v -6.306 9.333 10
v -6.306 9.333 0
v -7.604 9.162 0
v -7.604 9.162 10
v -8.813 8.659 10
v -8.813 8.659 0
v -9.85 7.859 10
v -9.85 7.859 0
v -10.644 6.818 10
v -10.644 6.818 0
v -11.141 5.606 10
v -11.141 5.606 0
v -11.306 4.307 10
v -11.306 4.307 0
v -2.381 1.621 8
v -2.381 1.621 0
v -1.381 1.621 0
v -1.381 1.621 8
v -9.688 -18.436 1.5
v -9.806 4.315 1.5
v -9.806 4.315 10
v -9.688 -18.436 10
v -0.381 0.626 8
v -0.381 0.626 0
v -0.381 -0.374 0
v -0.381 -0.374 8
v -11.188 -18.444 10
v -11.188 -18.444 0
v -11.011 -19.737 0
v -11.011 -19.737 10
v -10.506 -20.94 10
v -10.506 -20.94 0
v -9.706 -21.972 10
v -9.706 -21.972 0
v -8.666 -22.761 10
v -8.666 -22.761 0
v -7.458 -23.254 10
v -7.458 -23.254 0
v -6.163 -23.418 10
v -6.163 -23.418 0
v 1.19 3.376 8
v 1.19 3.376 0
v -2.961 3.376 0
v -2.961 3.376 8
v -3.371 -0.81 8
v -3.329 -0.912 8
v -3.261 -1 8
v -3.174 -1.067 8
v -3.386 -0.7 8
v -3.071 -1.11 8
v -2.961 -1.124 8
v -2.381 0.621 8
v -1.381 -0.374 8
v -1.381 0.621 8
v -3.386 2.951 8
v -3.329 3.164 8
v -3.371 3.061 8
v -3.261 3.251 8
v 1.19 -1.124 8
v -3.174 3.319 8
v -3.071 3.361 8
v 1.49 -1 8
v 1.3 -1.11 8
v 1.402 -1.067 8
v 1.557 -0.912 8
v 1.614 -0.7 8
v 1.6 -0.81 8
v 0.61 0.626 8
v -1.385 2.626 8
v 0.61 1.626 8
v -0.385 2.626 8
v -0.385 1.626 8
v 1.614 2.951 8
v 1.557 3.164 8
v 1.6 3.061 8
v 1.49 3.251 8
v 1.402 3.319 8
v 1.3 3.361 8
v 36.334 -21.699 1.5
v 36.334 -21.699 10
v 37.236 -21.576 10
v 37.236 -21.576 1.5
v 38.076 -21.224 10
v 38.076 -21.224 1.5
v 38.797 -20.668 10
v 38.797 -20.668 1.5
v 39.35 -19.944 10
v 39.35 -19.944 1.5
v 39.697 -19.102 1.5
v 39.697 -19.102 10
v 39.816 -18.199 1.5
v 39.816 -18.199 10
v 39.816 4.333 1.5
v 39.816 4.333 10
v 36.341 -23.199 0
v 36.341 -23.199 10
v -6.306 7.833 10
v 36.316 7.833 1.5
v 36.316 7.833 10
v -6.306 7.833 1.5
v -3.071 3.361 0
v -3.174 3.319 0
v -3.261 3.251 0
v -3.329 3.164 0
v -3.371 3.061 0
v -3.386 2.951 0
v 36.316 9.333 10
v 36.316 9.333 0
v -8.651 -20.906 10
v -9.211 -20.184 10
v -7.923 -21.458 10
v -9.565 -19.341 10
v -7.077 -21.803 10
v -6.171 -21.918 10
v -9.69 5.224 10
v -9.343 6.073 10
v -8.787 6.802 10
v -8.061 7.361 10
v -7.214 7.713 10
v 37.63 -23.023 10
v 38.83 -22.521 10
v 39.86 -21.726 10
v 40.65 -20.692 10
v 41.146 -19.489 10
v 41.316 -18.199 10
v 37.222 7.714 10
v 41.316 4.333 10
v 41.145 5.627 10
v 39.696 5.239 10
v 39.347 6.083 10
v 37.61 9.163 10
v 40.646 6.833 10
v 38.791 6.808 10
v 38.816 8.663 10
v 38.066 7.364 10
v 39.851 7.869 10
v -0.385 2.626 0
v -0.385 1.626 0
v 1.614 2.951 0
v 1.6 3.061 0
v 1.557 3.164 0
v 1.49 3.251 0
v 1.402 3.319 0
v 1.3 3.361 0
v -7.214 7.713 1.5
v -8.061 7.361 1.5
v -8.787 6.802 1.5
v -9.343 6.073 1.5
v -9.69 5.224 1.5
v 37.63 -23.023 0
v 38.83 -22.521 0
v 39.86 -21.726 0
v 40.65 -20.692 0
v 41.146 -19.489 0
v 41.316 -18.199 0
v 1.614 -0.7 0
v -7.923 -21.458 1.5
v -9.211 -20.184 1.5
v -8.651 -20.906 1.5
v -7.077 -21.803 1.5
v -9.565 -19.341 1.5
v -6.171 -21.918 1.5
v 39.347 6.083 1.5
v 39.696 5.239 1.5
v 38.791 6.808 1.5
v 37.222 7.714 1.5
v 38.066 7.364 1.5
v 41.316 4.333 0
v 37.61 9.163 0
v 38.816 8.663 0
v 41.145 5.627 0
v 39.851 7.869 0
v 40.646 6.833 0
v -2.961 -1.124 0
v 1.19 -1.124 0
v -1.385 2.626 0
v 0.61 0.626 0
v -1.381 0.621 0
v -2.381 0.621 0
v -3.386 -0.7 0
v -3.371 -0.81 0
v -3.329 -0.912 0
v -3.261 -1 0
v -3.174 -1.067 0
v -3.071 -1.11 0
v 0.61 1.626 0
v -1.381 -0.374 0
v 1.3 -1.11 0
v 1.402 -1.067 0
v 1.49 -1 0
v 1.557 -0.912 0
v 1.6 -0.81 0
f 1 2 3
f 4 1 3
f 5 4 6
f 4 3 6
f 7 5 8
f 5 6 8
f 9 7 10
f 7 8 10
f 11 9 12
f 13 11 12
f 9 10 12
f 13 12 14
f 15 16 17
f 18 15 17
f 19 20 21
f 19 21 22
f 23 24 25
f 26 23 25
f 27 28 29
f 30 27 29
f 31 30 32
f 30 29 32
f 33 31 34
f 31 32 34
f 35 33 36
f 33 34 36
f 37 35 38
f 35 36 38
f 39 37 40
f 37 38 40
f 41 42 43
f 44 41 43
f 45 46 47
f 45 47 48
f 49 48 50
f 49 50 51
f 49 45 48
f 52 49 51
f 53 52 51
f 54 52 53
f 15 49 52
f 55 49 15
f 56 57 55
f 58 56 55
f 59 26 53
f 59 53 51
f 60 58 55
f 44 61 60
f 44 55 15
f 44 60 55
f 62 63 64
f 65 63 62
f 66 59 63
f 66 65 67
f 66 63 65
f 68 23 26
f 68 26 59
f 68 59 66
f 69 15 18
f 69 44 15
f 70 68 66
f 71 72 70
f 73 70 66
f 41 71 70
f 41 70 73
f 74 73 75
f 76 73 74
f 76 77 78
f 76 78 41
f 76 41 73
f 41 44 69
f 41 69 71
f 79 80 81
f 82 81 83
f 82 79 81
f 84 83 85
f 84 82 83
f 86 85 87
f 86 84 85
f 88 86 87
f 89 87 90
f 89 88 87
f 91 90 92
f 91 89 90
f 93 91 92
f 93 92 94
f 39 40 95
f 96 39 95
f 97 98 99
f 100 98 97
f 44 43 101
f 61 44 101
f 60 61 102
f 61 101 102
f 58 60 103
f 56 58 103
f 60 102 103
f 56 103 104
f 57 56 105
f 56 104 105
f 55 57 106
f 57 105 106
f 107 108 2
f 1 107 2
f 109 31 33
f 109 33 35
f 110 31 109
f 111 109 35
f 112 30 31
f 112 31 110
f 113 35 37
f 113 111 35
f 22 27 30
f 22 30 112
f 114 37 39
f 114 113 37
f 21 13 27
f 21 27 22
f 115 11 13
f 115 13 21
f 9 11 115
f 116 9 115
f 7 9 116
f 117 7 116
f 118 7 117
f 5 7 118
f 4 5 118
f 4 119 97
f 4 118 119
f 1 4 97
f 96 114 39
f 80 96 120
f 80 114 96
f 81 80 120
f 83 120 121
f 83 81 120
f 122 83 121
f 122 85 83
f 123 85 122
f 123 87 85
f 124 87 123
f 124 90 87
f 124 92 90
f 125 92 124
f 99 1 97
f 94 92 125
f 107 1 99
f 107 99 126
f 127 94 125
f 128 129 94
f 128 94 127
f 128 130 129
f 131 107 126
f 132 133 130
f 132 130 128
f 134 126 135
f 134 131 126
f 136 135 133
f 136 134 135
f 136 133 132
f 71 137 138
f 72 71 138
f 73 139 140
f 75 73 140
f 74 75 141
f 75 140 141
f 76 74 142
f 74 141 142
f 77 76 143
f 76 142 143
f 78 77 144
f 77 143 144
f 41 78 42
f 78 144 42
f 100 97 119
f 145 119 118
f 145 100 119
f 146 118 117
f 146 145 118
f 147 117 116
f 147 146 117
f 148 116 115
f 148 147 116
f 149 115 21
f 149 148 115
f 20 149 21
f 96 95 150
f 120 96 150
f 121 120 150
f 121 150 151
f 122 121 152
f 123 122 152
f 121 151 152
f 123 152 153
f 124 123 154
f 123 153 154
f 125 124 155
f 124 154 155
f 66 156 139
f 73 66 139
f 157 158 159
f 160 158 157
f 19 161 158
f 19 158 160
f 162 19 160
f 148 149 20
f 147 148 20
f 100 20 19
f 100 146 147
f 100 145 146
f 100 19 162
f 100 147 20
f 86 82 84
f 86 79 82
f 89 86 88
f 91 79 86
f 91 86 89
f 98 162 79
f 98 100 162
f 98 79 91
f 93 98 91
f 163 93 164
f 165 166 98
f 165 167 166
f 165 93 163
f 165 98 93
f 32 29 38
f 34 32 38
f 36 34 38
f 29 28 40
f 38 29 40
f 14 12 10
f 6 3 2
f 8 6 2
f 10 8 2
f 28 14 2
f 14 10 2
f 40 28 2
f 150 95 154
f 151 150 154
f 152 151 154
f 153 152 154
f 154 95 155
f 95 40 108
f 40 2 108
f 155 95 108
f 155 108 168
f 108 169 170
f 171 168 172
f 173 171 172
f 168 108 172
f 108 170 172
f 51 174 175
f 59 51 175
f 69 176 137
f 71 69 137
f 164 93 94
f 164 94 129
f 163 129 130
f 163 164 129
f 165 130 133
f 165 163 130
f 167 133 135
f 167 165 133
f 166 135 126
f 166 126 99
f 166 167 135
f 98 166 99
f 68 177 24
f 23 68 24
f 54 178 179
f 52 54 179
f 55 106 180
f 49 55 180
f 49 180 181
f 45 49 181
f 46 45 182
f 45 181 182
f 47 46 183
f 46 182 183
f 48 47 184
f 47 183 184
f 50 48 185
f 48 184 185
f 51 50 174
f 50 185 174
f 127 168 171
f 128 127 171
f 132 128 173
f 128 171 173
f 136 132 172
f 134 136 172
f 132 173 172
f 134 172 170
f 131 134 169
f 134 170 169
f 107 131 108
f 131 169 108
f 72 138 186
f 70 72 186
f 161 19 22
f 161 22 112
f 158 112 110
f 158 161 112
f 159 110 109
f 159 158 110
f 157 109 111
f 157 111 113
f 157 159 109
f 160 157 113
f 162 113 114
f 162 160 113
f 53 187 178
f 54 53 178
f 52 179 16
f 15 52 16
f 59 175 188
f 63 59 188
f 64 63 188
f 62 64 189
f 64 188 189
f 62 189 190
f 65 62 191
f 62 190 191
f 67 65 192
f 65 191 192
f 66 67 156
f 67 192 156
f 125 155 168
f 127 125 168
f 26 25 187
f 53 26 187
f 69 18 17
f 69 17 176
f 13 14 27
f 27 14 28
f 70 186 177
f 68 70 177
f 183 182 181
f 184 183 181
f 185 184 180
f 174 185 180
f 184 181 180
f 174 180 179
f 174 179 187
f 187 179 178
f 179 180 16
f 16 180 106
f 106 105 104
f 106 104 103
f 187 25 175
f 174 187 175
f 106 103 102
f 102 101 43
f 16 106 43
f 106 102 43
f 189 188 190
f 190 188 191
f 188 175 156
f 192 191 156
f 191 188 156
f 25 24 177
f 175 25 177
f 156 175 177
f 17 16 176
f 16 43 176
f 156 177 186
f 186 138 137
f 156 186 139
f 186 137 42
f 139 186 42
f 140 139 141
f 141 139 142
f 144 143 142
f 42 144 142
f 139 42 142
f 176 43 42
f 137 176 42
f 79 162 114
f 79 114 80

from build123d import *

# Parameters (mm, degrees)
F1_DEPTH = 8
F3_DEPTH = 10
F4_T     = -1.5


with BuildPart() as f1:
    # F0 (on Top) → F1 (new body)
    with BuildSketch(Plane.XY):
        with BuildLine():
            Line((1.189774, 3.375806), (-2.96138, 3.375806))
            ThreePointArc((-2.96138, 3.375806), (-3.261492, 3.251495), (-3.385803, 2.951383))
            Line((-3.385803, 2.951383), (-3.385803, -0.699771))
            ThreePointArc((-3.385803, -0.699771), (-3.261492, -0.999884), (-2.96138, -1.124194))
            Line((-2.96138, -1.124194), (1.189774, -1.124194))
            ThreePointArc((1.189774, -1.124194), (1.489887, -0.999884), (1.614197, -0.699771))
            Line((1.614197, -0.699771), (1.614197, 2.951383))
            ThreePointArc((1.614197, 2.951383), (1.489887, 3.251495), (1.189774, 3.375806))
        make_face()
        Polygon((-1.380715, 1.621239), (-1.385407, 2.625805), (-0.385407, 2.625805), (-0.385407, 1.625805), (0.609883, 1.625805), (0.609883, 0.625805), (-0.380715, 0.625805), (-0.380715, -0.374195), (-1.380715, -0.374195), (-1.380715, 0.621239), (-2.380715, 0.621239), (-2.380715, 1.621239), align=None, mode=Mode.SUBTRACT)
    extrude(amount=F1_DEPTH)


with BuildPart() as f3:
    # F2 (on Top) → F3 (new body)
    with BuildSketch(Plane.XY):
        with BuildLine():
            ThreePointArc((-11.188459, -18.443849), (-9.705821, -21.971801), (-6.162799, -23.418057))
            Line((-6.162799, -23.418057), (36.341362, -23.199365))
            ThreePointArc((36.341362, -23.199365), (39.860254, -21.725858), (41.315637, -18.199431))
            Line((41.315637, -18.199431), (41.315637, 4.333014))
            ThreePointArc((41.315637, 4.333014), (39.851171, 7.868547), (36.315637, 9.333014))
            Line((36.315637, 9.333014), (-6.305584, 9.333014))
            ThreePointArc((-6.305584, 9.333014), (-9.850202, 7.85944), (-11.305518, 4.307288))
            Line((-11.305518, 4.307288), (-11.188459, -18.443849))
        make_face()
    extrude(amount=F3_DEPTH)

    # F4
    f4_openings = [f3.faces().sort_by_distance(p)[0] for p in [
        (14.999389, -6.980283, 10),
    ]]
    offset(amount=F4_T, openings=f4_openings)


solid = Compound([f1.part, f3.part])
